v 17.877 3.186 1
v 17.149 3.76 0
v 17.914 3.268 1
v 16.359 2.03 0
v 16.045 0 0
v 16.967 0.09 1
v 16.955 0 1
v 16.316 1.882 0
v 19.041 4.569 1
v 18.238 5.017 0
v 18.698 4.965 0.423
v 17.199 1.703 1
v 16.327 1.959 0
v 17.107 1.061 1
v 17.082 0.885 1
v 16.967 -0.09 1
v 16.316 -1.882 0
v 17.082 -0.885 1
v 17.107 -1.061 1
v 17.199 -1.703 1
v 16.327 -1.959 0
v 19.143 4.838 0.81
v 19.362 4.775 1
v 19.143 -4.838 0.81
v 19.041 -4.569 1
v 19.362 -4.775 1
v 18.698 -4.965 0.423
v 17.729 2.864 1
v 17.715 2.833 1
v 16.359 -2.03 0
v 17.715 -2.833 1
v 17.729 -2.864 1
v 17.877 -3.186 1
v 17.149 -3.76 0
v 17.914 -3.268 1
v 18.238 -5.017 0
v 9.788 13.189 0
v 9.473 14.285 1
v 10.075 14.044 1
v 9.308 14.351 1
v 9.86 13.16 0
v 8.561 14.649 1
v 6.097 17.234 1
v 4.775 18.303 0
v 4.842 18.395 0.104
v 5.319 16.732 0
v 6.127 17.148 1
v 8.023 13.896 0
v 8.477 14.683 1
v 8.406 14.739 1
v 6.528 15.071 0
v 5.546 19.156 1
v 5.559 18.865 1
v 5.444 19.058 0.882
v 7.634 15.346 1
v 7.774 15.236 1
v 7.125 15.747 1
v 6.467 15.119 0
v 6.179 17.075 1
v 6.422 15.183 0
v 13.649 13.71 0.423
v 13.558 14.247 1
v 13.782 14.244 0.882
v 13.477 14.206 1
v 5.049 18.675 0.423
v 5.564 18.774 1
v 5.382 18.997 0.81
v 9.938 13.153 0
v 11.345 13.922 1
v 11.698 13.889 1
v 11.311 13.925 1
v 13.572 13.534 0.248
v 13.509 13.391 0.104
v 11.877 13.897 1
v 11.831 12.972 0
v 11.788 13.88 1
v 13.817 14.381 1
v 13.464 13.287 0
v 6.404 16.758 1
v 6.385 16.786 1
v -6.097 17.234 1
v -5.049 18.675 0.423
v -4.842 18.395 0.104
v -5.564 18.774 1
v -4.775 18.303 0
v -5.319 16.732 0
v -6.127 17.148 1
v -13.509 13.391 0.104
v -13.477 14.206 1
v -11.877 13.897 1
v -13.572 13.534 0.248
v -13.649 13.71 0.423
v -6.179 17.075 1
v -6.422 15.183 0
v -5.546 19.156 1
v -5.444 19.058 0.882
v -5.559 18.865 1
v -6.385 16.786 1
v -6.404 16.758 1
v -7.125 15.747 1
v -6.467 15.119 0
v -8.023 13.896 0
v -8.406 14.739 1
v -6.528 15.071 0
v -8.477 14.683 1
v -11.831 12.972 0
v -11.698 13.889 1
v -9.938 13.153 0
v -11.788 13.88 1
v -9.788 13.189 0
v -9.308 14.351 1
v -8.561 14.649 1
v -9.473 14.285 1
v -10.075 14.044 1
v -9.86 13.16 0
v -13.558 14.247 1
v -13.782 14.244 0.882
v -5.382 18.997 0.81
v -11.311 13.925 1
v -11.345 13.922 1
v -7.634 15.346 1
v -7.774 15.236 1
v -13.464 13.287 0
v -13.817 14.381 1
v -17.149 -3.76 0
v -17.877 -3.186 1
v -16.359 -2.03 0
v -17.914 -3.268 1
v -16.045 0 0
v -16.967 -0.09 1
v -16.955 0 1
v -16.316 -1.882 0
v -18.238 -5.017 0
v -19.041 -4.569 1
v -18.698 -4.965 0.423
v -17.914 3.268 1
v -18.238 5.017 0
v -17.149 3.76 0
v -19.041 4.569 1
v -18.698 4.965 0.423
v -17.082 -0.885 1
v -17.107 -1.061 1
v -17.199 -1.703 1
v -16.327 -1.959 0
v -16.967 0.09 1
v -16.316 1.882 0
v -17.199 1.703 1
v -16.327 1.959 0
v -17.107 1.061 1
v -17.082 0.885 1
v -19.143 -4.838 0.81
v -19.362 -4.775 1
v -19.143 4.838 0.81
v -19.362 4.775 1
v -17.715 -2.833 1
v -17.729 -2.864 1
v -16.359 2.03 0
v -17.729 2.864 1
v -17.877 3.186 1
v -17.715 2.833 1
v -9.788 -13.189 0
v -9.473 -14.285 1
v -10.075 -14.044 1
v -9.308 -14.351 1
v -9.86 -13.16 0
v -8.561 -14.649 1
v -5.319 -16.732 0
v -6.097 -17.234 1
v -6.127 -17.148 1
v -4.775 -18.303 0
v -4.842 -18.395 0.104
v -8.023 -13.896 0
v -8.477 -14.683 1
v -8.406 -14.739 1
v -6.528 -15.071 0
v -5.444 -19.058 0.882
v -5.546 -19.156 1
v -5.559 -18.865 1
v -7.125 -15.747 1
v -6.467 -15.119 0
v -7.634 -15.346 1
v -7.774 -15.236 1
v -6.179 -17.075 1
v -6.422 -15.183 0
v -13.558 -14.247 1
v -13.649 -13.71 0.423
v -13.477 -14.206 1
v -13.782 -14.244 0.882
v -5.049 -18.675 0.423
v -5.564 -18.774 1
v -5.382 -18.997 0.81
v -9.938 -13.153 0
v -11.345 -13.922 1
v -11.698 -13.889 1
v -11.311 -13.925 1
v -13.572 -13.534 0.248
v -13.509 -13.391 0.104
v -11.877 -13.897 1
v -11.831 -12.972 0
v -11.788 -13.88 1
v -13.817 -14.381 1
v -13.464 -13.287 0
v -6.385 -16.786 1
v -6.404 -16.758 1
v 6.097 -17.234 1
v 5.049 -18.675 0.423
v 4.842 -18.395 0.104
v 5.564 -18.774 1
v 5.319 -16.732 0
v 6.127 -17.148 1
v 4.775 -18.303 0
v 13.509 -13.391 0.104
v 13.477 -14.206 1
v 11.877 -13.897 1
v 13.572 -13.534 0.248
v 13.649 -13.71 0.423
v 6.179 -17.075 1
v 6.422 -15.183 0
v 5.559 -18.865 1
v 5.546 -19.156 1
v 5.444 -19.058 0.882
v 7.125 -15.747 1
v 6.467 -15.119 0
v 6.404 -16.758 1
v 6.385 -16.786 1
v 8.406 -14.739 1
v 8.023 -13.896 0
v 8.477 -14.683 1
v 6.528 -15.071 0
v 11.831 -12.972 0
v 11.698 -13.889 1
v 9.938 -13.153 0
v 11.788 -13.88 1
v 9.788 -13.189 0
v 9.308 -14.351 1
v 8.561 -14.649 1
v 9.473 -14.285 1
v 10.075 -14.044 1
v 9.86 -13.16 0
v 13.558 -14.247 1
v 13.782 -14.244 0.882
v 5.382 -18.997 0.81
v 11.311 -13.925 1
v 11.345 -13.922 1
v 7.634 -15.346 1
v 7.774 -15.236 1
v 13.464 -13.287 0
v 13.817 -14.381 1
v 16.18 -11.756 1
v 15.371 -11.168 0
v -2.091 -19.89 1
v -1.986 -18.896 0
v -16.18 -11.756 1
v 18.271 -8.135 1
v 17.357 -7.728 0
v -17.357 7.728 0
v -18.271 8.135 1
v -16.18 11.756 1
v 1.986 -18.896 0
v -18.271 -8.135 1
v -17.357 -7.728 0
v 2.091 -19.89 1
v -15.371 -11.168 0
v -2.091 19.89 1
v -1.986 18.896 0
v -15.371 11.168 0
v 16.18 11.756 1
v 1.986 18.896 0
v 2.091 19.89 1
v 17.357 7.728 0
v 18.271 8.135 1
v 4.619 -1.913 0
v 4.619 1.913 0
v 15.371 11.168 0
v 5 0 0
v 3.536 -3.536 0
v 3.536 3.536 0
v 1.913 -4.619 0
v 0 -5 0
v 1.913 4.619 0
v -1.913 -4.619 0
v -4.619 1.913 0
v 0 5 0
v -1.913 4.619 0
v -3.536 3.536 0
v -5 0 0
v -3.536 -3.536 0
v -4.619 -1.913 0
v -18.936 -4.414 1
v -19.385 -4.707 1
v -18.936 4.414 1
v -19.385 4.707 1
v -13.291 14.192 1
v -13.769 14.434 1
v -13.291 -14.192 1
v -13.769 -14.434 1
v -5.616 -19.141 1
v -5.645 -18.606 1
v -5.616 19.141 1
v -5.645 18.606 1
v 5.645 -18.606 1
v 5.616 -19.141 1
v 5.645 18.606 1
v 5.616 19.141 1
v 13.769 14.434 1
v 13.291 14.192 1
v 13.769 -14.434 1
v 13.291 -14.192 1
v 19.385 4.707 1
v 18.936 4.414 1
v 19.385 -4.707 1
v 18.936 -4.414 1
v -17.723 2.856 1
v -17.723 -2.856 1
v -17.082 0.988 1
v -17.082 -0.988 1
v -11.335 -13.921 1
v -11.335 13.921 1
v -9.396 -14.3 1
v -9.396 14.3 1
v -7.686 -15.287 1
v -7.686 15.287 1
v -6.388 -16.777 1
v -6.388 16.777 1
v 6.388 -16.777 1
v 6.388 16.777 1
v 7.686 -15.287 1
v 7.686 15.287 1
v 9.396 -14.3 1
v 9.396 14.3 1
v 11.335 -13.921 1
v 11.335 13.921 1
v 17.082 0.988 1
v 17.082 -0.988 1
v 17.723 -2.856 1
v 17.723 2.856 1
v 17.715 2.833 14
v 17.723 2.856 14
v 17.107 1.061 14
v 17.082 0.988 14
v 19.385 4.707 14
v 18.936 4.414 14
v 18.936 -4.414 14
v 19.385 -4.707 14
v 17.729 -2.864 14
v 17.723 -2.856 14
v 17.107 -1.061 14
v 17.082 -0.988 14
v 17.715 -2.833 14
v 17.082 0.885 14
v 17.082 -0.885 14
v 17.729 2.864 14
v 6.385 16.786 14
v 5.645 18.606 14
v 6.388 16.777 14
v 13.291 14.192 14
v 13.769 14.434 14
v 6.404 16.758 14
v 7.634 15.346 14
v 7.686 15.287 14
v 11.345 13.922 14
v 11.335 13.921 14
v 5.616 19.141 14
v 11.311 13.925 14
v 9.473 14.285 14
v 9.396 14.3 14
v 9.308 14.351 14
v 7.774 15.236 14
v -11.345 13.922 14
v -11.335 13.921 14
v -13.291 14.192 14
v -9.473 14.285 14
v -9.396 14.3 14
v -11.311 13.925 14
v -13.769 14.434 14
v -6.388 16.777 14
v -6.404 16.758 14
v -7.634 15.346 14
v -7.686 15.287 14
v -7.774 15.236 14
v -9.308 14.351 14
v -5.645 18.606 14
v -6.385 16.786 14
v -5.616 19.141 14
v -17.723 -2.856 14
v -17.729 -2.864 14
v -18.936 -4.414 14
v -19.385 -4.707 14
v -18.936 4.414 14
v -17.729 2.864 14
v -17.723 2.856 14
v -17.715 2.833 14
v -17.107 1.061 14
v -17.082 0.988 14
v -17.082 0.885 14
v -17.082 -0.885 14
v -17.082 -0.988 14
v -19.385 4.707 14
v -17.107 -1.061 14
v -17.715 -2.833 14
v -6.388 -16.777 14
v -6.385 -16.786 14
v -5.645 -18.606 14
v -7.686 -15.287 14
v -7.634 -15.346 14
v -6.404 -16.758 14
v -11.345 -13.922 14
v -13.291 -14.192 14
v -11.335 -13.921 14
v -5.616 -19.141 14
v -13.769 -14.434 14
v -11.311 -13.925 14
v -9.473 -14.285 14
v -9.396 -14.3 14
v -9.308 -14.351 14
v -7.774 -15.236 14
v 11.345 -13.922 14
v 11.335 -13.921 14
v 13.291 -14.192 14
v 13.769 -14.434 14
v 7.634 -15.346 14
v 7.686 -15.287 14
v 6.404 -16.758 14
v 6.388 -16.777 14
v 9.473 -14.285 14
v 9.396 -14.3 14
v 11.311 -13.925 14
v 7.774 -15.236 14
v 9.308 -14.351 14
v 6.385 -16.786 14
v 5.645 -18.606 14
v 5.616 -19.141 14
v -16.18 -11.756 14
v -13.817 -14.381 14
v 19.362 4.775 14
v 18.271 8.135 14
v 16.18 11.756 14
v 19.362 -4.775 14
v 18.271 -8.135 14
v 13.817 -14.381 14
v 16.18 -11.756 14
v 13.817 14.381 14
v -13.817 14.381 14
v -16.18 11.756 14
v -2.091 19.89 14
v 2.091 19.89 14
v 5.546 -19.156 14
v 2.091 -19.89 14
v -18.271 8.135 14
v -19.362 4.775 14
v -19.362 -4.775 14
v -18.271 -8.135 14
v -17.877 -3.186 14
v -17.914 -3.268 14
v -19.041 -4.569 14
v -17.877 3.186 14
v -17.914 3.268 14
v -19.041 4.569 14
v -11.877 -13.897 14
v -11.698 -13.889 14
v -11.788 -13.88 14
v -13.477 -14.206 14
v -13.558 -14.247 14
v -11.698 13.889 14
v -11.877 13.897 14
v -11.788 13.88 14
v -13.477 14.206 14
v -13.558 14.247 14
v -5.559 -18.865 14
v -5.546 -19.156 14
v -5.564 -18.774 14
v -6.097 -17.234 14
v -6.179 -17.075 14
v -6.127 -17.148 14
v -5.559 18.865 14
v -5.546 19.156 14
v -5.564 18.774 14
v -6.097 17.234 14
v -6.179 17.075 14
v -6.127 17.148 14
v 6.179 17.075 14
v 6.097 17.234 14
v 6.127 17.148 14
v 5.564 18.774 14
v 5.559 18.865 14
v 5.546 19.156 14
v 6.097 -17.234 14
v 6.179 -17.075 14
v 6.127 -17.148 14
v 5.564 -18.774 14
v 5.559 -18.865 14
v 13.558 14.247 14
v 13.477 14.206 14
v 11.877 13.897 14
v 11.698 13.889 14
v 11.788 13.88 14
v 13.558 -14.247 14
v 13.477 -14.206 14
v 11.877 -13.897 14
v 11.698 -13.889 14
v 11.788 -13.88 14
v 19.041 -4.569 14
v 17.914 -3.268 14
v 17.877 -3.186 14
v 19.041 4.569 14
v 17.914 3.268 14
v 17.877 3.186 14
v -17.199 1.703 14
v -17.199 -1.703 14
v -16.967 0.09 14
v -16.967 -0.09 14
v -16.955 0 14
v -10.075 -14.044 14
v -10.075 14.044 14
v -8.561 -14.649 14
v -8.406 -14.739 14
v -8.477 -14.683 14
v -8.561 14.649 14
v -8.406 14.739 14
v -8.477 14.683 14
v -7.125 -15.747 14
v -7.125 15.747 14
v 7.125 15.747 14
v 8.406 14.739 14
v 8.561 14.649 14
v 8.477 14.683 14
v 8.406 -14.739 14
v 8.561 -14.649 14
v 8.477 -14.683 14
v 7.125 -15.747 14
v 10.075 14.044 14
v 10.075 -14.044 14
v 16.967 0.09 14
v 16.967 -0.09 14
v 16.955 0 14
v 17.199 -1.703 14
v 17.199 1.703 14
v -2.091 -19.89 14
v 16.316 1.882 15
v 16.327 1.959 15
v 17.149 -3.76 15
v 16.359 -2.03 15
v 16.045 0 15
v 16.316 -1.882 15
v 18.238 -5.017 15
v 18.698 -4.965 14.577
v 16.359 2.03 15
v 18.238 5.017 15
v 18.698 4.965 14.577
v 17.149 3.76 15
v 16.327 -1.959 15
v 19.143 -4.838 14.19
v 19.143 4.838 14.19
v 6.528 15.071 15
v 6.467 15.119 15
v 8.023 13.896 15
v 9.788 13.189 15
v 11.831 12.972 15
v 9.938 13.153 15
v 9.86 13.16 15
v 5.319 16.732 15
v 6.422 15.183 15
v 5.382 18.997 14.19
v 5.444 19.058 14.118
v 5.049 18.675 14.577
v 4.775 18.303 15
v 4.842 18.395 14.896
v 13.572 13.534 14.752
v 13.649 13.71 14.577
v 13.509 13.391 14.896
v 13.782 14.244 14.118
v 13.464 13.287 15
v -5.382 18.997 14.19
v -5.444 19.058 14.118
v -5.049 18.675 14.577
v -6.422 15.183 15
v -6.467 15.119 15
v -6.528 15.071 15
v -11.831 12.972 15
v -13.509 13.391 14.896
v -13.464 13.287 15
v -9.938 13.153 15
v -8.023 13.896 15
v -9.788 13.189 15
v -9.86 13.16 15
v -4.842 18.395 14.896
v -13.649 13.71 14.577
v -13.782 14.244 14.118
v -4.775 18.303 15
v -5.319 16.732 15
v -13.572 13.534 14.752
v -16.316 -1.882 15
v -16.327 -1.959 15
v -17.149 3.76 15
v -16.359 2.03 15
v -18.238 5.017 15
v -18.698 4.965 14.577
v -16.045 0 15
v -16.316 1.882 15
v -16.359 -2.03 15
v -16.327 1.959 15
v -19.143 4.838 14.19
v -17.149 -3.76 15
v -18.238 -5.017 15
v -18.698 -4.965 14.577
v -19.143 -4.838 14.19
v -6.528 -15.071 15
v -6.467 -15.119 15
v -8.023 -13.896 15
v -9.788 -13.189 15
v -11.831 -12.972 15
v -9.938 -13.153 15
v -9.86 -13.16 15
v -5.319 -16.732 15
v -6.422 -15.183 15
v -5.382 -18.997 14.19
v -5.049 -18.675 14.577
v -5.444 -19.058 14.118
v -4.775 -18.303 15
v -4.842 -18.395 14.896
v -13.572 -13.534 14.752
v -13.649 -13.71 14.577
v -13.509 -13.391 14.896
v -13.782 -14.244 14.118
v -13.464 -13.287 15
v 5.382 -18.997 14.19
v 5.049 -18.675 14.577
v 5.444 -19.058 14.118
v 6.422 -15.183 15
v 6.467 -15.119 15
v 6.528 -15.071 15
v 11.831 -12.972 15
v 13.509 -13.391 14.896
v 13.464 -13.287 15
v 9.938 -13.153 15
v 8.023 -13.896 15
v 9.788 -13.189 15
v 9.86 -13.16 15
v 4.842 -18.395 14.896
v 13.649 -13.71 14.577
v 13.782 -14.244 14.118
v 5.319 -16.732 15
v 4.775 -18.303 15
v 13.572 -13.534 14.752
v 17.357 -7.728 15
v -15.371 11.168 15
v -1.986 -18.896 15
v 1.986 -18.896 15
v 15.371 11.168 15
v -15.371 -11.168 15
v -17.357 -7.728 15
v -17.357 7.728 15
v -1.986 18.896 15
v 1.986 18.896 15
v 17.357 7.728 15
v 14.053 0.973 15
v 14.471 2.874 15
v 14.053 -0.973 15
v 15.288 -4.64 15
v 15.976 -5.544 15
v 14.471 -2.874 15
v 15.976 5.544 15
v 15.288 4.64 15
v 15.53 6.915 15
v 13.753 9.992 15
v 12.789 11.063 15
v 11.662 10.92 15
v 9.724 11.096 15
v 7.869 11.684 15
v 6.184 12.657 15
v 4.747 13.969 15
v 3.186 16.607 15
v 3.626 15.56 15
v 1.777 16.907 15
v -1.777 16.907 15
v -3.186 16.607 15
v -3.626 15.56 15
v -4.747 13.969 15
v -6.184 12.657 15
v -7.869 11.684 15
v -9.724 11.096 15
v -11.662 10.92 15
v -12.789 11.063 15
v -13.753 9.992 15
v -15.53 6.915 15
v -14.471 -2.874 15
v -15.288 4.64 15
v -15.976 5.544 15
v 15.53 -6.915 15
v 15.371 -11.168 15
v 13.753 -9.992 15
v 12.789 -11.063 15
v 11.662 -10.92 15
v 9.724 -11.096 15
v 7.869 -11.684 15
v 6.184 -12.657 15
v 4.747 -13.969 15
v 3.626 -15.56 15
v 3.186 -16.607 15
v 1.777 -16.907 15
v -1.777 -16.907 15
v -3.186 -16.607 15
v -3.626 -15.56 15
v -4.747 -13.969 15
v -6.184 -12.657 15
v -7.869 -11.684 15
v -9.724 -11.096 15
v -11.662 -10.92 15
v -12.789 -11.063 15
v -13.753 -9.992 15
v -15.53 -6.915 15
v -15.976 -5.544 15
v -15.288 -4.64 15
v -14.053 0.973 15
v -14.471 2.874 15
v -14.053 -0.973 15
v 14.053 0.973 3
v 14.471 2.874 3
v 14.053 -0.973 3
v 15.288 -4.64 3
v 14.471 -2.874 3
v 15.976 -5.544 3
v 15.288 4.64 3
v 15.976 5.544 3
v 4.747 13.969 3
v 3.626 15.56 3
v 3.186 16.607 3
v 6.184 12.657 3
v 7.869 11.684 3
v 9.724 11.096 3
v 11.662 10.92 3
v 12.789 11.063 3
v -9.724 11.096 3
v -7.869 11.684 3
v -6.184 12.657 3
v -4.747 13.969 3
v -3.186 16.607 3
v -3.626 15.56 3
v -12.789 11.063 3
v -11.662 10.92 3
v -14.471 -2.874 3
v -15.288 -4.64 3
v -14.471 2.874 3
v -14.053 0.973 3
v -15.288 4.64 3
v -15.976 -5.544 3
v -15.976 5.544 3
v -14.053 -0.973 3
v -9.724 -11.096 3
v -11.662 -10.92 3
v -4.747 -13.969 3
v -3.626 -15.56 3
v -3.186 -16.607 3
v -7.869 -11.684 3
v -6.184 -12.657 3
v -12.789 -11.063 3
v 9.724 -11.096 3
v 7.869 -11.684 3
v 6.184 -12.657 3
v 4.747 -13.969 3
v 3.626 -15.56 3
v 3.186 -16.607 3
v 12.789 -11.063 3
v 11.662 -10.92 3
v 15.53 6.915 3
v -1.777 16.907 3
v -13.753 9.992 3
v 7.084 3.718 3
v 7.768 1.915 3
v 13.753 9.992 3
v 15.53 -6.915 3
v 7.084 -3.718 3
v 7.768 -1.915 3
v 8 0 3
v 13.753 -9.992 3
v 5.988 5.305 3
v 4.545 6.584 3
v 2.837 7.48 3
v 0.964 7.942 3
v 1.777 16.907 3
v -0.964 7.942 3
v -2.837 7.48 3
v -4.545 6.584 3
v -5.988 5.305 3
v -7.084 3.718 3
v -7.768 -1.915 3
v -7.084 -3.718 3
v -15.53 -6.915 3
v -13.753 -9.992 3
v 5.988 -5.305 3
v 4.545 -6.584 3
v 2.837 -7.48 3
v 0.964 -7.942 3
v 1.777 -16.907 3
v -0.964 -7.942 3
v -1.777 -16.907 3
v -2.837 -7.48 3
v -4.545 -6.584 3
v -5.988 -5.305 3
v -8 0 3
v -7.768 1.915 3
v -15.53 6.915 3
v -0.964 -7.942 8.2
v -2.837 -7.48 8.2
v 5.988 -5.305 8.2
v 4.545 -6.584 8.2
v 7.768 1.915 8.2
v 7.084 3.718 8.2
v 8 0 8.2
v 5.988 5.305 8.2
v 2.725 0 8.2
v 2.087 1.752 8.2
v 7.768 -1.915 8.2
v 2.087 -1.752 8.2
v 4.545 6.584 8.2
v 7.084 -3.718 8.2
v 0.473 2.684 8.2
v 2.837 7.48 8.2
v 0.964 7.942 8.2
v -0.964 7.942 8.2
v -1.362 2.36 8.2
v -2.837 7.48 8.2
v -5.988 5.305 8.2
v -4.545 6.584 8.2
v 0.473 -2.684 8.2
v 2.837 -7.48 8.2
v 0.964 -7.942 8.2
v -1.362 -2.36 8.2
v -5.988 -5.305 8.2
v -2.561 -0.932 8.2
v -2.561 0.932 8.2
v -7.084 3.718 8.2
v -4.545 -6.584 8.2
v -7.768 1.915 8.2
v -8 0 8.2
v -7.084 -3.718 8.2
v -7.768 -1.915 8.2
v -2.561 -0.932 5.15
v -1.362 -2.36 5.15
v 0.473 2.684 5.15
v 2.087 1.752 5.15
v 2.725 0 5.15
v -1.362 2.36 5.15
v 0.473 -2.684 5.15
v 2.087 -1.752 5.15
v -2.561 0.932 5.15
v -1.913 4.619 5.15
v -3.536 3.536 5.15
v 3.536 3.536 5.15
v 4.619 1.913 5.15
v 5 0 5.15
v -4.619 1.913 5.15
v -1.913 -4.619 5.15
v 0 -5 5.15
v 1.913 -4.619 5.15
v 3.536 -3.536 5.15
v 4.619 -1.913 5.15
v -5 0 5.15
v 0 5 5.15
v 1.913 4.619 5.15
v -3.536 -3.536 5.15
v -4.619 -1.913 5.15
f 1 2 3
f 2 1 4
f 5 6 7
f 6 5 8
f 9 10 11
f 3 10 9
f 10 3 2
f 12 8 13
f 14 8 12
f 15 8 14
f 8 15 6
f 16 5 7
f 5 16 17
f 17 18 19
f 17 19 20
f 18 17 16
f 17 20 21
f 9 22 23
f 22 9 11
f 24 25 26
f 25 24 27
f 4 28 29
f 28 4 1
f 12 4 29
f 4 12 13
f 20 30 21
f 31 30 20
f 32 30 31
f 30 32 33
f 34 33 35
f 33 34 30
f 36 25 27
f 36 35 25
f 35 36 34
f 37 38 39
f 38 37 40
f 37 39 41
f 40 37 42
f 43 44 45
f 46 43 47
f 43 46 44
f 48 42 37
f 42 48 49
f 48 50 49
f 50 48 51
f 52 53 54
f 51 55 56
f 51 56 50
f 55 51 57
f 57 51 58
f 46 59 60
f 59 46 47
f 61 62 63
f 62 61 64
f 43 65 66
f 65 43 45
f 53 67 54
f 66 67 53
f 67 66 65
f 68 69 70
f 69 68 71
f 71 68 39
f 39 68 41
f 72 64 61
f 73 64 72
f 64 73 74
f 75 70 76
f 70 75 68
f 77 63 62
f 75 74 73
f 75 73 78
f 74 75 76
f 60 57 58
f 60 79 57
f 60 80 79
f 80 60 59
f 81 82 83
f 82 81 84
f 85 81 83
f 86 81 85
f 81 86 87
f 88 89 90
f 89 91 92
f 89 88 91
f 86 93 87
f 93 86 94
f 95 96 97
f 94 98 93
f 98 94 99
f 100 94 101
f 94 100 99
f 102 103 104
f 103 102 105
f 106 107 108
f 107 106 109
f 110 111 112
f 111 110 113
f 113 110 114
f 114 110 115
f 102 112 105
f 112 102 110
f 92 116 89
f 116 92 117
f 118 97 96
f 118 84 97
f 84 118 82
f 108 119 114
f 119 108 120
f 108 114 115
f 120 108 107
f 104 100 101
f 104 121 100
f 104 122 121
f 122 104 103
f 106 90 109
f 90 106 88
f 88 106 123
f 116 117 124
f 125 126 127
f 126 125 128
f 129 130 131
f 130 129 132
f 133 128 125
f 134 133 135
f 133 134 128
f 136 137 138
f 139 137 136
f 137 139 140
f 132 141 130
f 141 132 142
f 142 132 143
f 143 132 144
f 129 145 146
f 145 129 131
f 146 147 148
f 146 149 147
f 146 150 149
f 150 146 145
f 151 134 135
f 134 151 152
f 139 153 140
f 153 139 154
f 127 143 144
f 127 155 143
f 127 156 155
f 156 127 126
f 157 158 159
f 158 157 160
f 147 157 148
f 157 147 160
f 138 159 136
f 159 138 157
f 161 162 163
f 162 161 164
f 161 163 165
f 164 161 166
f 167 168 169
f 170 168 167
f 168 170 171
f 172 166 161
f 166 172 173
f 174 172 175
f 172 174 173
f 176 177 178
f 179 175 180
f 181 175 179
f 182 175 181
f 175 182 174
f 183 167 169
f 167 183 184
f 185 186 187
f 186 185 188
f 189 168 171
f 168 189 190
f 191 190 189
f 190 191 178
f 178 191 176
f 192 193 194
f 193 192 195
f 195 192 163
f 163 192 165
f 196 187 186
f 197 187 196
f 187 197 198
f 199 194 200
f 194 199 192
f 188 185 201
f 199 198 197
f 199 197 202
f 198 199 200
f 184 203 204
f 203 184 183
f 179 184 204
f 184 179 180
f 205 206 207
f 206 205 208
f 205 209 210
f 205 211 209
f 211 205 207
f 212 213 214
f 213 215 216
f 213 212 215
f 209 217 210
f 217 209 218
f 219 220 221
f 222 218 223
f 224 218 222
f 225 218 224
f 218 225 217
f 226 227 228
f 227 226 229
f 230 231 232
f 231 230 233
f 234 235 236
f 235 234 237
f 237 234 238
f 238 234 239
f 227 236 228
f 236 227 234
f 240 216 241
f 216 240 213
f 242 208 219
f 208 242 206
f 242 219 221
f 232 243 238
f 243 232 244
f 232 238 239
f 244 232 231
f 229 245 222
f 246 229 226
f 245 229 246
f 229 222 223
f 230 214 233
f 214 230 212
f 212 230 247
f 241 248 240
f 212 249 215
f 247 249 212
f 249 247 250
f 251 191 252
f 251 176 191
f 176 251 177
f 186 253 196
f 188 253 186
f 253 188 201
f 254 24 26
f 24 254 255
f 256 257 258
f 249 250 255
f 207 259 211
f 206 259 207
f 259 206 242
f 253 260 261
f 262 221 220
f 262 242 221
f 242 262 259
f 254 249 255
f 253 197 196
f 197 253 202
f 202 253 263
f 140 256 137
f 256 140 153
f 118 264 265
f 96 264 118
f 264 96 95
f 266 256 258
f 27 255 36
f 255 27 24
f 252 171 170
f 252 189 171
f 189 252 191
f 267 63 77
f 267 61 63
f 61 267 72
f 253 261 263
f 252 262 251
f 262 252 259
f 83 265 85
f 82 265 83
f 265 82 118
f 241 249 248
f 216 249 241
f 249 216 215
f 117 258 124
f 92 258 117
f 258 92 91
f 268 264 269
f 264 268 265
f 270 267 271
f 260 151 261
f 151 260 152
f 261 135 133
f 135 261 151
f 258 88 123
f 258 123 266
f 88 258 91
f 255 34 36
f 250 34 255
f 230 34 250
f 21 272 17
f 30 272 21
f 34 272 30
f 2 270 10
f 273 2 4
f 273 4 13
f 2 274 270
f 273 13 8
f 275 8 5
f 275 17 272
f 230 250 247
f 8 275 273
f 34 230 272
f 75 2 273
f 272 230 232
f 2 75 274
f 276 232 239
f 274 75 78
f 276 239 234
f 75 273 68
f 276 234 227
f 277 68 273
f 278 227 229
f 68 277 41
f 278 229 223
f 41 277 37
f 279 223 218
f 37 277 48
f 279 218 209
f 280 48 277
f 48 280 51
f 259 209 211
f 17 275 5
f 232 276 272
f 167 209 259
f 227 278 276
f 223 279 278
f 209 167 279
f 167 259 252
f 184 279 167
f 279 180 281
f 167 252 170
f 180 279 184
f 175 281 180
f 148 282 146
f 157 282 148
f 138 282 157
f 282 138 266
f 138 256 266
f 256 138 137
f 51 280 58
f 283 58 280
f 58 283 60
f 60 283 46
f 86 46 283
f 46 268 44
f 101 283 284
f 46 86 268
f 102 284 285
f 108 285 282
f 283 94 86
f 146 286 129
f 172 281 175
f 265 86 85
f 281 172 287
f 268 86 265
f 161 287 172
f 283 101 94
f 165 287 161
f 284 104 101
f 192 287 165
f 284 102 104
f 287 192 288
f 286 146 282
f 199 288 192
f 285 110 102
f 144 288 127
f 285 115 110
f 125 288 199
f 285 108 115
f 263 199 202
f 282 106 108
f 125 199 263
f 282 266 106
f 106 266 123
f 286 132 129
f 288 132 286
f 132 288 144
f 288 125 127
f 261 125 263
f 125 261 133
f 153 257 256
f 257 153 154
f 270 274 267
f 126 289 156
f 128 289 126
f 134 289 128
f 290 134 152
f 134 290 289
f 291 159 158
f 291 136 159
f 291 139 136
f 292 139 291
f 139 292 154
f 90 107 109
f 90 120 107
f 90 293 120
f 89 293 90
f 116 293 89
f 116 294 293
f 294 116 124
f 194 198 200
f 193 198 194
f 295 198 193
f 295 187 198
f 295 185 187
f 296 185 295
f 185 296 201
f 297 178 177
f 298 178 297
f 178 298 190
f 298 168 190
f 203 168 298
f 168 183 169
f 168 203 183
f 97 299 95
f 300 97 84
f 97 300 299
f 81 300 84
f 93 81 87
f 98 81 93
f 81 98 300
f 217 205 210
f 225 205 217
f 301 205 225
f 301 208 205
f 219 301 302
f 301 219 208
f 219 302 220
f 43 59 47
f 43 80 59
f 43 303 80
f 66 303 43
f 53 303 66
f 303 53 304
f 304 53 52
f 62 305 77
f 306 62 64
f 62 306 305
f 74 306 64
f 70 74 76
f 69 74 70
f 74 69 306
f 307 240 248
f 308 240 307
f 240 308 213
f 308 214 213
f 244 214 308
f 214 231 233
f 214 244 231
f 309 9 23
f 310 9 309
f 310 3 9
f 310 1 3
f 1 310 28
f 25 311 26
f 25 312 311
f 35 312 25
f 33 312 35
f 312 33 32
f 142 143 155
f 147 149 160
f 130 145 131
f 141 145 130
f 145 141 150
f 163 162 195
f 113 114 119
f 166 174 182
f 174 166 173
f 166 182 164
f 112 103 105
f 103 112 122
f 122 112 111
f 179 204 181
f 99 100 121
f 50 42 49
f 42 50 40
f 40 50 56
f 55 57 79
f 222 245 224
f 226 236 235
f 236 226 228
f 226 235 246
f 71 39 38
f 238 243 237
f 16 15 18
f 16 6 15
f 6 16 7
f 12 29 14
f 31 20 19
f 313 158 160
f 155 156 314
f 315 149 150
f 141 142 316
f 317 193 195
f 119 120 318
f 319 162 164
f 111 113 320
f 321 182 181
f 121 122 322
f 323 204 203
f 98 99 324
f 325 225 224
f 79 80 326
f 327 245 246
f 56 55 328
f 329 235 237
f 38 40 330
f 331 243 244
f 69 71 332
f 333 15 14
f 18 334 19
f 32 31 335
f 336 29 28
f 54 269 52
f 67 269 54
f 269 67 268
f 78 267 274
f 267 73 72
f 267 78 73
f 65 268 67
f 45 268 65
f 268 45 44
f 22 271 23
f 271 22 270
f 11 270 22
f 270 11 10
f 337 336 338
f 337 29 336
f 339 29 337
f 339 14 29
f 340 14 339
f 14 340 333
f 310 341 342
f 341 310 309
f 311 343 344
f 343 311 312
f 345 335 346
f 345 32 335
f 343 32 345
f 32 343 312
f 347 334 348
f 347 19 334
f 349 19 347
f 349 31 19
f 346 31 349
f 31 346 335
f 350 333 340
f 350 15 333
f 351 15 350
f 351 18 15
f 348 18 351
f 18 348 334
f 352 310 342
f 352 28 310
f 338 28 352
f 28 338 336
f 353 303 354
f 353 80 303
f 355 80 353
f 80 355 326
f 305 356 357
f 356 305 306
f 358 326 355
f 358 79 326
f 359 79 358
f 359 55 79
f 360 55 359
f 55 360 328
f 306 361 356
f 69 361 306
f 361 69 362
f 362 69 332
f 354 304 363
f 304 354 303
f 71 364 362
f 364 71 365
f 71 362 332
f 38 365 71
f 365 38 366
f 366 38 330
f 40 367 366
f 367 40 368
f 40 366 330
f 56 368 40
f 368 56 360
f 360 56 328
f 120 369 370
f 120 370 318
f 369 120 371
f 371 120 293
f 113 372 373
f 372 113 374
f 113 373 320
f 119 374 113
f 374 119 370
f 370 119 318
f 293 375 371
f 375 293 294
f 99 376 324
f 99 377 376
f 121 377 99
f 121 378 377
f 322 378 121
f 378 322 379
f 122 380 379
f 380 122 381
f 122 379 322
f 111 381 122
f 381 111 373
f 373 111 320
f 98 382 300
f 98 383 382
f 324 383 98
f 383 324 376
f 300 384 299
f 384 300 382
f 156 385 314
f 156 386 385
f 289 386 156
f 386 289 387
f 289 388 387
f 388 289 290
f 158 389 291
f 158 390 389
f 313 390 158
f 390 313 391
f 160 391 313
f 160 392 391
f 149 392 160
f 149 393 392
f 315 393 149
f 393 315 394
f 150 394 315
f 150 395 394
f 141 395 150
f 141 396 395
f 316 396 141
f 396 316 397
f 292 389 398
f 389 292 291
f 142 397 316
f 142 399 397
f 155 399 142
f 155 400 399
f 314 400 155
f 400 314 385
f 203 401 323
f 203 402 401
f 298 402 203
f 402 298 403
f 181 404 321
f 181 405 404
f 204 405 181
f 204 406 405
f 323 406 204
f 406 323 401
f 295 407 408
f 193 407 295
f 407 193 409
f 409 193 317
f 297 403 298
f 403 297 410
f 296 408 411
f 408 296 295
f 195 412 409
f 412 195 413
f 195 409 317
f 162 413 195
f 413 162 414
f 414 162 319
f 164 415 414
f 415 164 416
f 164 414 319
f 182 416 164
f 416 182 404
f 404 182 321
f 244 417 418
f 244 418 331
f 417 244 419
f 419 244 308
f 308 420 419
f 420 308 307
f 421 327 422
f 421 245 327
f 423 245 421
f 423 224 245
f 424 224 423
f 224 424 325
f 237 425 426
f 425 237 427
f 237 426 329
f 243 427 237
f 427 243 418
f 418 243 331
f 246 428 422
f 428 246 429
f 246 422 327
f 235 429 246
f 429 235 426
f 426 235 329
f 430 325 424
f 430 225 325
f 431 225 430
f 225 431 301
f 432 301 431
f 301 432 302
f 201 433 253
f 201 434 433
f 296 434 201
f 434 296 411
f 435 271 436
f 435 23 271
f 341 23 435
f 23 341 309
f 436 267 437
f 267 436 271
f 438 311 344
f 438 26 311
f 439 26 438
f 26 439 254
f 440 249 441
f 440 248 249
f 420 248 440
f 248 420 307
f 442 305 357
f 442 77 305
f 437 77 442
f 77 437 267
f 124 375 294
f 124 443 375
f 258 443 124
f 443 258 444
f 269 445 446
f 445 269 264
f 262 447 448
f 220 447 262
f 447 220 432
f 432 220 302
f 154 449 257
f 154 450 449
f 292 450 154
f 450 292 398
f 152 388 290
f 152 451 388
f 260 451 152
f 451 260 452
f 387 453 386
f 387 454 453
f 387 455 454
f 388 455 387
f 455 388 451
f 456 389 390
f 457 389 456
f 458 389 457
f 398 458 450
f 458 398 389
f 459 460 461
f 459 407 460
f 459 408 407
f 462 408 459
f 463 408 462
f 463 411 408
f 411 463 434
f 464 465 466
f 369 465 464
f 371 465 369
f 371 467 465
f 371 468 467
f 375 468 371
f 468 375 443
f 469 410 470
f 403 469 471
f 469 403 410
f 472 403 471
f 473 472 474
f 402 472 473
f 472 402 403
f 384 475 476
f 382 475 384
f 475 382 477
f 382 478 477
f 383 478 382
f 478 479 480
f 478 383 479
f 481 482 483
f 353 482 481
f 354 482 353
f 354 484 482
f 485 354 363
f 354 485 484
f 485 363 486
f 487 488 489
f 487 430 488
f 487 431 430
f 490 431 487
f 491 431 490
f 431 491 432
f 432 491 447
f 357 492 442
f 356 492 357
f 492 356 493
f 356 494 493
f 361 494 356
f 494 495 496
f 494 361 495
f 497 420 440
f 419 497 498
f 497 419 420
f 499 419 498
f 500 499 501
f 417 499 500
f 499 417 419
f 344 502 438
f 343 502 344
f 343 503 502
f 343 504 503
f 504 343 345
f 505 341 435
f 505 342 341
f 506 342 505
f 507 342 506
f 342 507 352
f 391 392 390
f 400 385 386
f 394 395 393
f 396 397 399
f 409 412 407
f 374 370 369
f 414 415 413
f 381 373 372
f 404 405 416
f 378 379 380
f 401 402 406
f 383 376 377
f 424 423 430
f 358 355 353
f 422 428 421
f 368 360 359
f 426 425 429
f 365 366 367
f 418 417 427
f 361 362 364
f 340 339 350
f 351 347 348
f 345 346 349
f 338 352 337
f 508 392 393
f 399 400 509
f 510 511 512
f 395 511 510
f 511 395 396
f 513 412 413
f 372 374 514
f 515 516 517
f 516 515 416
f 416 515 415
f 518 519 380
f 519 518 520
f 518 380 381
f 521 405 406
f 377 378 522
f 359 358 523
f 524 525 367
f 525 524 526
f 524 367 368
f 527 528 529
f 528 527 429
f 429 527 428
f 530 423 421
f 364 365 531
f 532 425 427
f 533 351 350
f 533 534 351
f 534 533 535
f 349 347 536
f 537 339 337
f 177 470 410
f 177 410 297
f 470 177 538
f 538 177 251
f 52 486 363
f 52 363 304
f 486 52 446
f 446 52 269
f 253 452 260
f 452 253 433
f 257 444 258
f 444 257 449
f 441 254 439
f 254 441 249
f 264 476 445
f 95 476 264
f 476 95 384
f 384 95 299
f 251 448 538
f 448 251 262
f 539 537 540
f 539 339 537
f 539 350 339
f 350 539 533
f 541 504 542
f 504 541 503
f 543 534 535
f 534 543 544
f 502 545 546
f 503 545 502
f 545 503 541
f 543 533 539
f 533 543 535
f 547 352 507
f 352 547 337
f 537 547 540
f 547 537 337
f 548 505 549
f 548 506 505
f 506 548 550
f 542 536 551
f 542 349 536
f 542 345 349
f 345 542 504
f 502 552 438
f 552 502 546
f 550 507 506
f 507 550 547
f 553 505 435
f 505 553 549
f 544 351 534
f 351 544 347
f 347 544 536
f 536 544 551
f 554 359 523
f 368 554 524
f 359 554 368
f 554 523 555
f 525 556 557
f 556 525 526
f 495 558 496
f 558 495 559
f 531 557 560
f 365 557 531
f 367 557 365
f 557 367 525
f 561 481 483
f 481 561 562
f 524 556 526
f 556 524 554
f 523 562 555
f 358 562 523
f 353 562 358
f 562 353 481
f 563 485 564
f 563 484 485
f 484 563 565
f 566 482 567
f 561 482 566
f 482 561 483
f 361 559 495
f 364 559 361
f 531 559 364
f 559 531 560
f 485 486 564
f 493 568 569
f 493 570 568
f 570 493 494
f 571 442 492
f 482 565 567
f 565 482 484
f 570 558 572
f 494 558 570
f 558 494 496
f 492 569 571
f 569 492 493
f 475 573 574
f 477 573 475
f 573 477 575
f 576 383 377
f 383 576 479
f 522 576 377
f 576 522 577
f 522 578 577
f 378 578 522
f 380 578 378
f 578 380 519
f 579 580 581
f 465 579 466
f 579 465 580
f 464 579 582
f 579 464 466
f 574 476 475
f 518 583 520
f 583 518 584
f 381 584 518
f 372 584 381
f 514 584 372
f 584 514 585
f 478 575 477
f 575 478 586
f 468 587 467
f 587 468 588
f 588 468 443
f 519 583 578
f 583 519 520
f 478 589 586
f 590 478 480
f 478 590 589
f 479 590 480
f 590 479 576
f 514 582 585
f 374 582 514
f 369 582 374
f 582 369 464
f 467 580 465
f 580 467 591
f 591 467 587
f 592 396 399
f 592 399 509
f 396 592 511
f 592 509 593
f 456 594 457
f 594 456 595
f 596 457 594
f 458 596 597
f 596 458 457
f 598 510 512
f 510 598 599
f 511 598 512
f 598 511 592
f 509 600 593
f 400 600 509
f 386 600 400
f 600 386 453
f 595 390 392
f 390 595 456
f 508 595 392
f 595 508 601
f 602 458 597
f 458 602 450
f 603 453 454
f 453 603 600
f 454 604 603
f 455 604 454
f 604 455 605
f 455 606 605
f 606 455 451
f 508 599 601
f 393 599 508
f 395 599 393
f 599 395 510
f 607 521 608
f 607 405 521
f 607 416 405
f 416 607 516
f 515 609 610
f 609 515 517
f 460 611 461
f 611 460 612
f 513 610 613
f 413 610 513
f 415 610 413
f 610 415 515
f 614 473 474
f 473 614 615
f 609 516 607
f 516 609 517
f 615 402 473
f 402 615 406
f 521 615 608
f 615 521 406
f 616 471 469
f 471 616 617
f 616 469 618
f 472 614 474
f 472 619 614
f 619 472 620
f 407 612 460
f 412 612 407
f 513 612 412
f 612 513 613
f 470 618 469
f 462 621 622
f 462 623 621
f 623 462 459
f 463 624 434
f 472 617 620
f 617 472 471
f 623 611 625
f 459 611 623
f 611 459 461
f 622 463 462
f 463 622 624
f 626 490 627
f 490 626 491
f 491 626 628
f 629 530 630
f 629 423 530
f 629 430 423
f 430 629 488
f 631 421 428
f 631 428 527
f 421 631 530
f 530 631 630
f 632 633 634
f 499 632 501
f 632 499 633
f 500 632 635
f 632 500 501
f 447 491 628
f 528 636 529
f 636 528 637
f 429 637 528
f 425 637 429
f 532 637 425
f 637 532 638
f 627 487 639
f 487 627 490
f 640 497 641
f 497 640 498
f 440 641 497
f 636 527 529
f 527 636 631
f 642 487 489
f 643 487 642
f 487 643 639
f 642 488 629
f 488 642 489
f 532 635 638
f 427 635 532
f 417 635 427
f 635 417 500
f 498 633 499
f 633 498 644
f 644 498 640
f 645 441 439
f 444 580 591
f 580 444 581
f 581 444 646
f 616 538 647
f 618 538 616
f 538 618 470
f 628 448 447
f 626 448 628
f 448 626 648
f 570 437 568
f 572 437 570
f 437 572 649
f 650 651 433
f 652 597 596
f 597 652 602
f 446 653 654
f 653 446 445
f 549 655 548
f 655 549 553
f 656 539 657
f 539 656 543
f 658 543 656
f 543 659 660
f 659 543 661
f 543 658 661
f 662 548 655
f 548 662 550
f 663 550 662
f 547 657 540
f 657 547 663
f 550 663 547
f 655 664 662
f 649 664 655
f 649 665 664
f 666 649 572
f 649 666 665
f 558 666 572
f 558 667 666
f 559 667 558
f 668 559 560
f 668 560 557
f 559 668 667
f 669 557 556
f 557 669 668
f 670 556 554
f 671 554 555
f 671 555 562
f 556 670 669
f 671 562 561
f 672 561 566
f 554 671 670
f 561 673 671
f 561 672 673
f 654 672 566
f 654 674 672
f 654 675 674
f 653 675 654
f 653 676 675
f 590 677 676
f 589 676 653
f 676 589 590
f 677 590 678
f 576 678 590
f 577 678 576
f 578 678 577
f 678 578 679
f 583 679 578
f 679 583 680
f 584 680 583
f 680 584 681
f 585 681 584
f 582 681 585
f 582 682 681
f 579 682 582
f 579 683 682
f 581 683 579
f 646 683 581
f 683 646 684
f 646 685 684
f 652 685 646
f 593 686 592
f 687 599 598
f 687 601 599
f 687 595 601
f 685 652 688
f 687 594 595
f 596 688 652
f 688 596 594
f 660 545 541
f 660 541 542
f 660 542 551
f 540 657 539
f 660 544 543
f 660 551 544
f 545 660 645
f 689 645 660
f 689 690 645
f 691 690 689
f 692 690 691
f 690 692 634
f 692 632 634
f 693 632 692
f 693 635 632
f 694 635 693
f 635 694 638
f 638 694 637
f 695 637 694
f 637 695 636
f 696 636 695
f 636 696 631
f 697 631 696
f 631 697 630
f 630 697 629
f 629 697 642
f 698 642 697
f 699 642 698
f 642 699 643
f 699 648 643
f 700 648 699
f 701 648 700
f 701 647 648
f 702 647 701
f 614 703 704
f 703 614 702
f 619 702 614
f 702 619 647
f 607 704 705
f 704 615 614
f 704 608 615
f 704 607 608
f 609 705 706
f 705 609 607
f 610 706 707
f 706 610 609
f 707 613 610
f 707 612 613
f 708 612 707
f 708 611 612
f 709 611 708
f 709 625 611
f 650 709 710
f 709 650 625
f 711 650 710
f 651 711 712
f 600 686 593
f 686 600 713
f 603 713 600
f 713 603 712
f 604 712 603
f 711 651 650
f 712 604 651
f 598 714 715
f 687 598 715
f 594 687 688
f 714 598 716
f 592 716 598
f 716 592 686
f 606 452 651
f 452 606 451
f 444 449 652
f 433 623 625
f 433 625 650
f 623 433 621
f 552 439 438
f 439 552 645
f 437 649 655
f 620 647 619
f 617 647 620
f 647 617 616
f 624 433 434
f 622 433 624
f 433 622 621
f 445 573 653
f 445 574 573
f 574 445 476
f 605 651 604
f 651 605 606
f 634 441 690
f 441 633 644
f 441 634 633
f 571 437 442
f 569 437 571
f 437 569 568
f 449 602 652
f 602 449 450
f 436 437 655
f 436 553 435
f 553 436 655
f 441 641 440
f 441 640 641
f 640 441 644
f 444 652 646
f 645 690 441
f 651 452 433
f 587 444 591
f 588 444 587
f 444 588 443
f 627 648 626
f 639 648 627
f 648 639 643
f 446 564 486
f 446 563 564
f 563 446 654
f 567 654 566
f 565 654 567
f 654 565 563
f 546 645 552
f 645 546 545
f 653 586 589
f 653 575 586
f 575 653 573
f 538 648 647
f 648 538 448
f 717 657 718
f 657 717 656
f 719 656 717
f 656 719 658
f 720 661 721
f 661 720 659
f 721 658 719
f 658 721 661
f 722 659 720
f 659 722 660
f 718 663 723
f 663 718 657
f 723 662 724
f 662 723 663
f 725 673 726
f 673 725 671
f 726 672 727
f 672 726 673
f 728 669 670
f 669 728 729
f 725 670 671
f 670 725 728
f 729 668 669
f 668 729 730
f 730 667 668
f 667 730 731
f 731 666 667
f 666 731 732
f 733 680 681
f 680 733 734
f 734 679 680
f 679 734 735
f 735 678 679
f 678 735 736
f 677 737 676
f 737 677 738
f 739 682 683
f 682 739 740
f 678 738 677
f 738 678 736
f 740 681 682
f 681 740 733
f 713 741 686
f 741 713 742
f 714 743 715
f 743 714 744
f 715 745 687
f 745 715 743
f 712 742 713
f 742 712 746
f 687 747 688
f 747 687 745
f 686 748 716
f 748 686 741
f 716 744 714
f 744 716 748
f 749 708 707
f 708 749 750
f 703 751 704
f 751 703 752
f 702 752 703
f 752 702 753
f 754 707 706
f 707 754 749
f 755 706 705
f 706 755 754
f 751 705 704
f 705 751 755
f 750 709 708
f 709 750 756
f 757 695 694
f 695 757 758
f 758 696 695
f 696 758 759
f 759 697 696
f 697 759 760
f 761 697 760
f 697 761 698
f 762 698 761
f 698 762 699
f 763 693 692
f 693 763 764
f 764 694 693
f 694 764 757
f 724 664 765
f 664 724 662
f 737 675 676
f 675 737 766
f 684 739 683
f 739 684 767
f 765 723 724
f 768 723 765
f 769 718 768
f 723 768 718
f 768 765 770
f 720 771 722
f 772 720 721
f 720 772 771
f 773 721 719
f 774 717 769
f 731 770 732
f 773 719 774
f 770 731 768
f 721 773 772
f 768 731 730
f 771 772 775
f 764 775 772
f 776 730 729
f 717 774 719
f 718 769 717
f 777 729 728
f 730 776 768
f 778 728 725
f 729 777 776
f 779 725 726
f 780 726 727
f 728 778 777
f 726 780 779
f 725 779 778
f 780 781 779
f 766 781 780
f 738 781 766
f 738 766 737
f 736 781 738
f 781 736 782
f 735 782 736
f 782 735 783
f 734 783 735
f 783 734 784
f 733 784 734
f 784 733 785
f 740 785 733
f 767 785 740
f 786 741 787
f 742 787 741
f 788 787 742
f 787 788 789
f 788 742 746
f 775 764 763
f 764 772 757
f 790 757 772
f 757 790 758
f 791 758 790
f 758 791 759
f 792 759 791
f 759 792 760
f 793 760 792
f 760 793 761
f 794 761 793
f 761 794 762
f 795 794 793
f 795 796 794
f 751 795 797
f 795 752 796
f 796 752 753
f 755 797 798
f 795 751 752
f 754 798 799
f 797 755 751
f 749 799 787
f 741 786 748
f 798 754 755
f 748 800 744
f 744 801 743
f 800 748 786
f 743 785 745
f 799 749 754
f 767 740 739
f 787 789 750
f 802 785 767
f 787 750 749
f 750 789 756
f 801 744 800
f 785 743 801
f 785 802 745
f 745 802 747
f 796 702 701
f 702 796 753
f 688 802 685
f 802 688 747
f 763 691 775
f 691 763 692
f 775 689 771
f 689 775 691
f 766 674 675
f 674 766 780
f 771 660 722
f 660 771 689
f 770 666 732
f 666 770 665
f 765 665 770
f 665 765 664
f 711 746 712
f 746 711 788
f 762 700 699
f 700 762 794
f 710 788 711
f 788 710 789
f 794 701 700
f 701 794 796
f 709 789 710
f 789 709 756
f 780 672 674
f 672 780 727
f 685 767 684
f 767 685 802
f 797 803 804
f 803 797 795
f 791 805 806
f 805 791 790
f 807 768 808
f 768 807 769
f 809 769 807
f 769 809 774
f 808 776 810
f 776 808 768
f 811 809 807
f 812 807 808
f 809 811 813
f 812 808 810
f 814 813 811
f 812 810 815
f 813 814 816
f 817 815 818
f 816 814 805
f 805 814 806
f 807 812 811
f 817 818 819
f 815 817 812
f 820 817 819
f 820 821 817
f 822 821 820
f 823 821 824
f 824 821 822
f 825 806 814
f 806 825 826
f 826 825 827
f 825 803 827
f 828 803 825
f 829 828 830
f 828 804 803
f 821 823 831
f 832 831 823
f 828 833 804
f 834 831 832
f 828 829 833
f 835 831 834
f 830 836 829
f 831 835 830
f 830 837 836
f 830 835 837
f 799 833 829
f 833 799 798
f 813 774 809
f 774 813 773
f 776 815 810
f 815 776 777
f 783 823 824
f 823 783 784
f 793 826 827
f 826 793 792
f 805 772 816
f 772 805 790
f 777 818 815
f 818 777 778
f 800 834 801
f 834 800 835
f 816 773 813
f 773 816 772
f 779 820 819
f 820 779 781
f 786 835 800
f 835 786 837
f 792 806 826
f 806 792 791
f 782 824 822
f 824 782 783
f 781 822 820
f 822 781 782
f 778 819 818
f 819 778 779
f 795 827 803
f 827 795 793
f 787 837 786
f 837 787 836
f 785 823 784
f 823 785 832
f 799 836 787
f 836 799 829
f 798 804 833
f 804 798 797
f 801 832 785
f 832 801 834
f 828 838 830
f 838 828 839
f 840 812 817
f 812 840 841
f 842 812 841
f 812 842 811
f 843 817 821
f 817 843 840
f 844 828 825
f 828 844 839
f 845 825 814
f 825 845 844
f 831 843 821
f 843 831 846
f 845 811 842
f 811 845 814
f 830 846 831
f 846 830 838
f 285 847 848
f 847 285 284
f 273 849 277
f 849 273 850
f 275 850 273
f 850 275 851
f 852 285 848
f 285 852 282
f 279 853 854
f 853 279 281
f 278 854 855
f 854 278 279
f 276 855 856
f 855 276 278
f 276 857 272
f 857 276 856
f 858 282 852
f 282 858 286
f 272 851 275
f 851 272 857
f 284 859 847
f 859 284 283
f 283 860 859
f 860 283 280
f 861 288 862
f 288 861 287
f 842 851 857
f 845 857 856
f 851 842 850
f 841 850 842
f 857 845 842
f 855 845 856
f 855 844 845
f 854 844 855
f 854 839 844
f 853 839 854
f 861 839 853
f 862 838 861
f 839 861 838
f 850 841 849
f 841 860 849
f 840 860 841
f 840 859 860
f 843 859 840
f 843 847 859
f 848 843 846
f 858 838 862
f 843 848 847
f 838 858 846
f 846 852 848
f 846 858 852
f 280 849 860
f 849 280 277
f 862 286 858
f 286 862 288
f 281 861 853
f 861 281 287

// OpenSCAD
/*
Universal Thumbnut/Socket Knob Design
By: Harrison Fast (2013)

This is a parametric script for a thumb knob which can be used on either a nut, hex head cap screw, or socket head cap screw.
Options include:
unit of measure (metric, imperial)
thread size []
pocket type (Constant_Wall_Thickness, Solid, Circular)
knob diameter
number of rosettes (fingers/cutouts)
size and position of rosette
wall thickness
top wall thickness

Should work in the Thingiverse Customizer

*/

//****Variables - To be Set****\\
//CUSTOMIZER VARIABLES

//What's This Knob For?
Knob_Type=3;//[1:Nut,2:Hex Head Screw,3:Socket Head Screw]

//What Size Nut or Screw? 
Thread_Size=6; //[0:M1.6,1:M2,2:M2.5,3:M3,4:M4,5:M5,6:M6,7:M8,8:M10,9:M12,10:M14,11:M16,12:M20]

//What Kind of Pocket Do You Want?
Knob_Fill=1;//[1:Constant Wall Thickness,2:Solid,3:Circular Cut-Out]

//How Big Should The Knob Be?
Knob_Diameter = 40;
knob_r = Knob_Diameter/2;

//How Thick Should the Grip Be? (Overall Height)
Knob_Thickness=15;
knob_t=Knob_Thickness*1;

//How Thick Should The Walls Be?
Wall_Thickness=3;

//How Many Prongs Should It Have?
Number_of_Rosettes=6; //[1:16]

//How Big Should The Finger Dents Be?
Rosette_Radius=6; 

//How Far Should The Finger Dents be From The Knob Circumference? (This lets you use larger radii by moving the center of the cut-out cylinder away from the center of the knob)
Rosette_Offset = 3;

//How Big Should the Bevel Be?
Chamfer_Size=1;
r_cham = Chamfer_Size*1; //Too lazy to change the proper names to Chamfer_Size

//How Much Clearance Do You Want? 0 probably won't work.
Clearance=.25; //[0:.125:1];

//CUSTOMIZER VARIABLES END


//$fa=6;


echo(knob_t);
knob_hex(); //main function call


//****MODULES***\\

module hex_trude(hex_width,hex_height) //makes a hexagonal prism at hex_width
	{	
		s = hex_width/1.732;
		l_x=s/2;
		l_y=.866*s;
		a_1 = [ [s,0],[l_x,-l_y],[-l_x,-l_y],[-s,0],[-l_x,l_y],[l_x,l_y]];
		b=[0:5];
		linear_extrude (height = hex_height) polygon(a_1,b);
	}


module pocket(hex_width,hex_height)
{	
	if(Knob_Fill==1){
		difference() {
			 translate([0,0,Wall_Thickness]) {cylinder(h=hex_height, r=knob_r-Wall_Thickness);} //wall offset
				for(i=[0:Number_of_Rosettes-1]) {
					rotate([0,0,360*i/Number_of_Rosettes]) 
						translate([knob_r+Rosette_Offset,0,0]) {
							cylinder(h = Wall_Thickness+hex_height, r = Rosette_Radius+Wall_Thickness); } //wall offset rosette
								}
	}//endif
					}

	else if(Knob_Fill==2){
	}//endif

	else if(Knob_Fill==3) {
		translate([0,0,Wall_Thickness]) {
			cylinder(h=hex_height,r=knob_r-Wall_Thickness-Rosette_Radius+Rosette_Offset);
						}
	}//endif
			
} //end module pocket()



module knobby_base_parts(knob_r, knob_h, rA, rB)
{
	difference()
	{
		cylinder(h=knob_h,r1=knob_r-rA,r2=knob_r-rB);
		for(i=[0:Number_of_Rosettes]){
			rotate(360*i/Number_of_Rosettes,[0,0,1]) translate([knob_r+Rosette_Offset,0,-0.05])
				cylinder(h=knob_h+.1,r1=Rosette_Radius+rA,r2=Rosette_Radius+rB);
		} //end if
	} //end difference
} //end knobby_base_parts



module knobby_base(hex_width,hex_height,r_cham)
{
	difference(){
			union() {
				knobby_base_parts(knob_r,r_cham,r_cham,0);
				if(hex_height<Wall_Thickness){
					union() {
						translate([0,0,r_cham]) knobby_base_parts(knob_r,Wall_Thickness-2*r_cham,0,0); 
						translate([0,0,Wall_Thickness]) knobby_base_parts(knob_r, r_cham,0,r_cham);}}

				else {translate([0,0,r_cham]) knobby_base_parts(knob_r,hex_height-2*r_cham,0,0);
					union() {
						translate([0,0,r_cham]) knobby_base_parts(knob_r,hex_height-2*r_cham,0,0); 
						translate([0,0,hex_height-r_cham]) knobby_base_parts(knob_r, r_cham,0,r_cham); }}
				} //end union
			pocket(hex_width,hex_height+1);
					} //end difference
} //end knobby_base


module make_knob(hex_width,hex_height,r_cham)
{
	if(Knob_Type==1){
	difference(){
			union(){
			rotate(0,[0,0,1]) {
			difference(){
				knobby_base(hex_width,knob_t,r_cham);
				translate([0,0,Wall_Thickness])hex_trude(hex_width+.25,hex_height+1+knob_t);
				}}
			translate([0,0,Wall_Thickness]) {
				difference() {
					hex_trude(hex_width+Wall_Thickness*2,hex_height);
					hex_trude(hex_width+.25,hex_height+.1);}
					}}
		translate([0,0,-.1]) cylinder(h=Wall_Thickness+hex_height+.2, r = Thread_Size/2+.25);
	 } 	//end Difference
	} //end if

	else if(Knob_Type==2) {
	difference() {
		union() {
			knobby_base(hex_width,knob_t,r_cham);
			cylinder(h=hex_height+Wall_Thickness, r=hex_width/2+Wall_Thickness);
			} //end union
		translate([0,0,-.05]) hex_trude(hex_width+.25,hex_height);
		translate([0,0,-.5]) cylinder(h=hex_height+Wall_Thickness+1+knob_t, r=thread_d[Thread_Size]/2+.125);
		}//end difference
	}//end if
			

	else if(Knob_Type==3) {
	difference(){
		union() {
			knobby_base(hex_width,knob_t,r_cham);
			cylinder(h=hex_height+Wall_Thickness, r=hex_width/2+Wall_Thickness);
		}//end union
			translate([0,0,-.05]) cylinder(h=hex_height+Knob_Thickness, r=hex_height/2+.125);
			translate([0,0,-.05]) cylinder(h=hex_height, r=hex_width/2);
	} //end difference
		} //end if
} //end module make_knob_hex


module knob_hex(){
	if (Knob_Type==1 || 2){
		make_knob(hex_w_table[Thread_Size],hex_h_table[Thread_Size],r_cham);
		}//end if
	else if (Knob_Type==3){
		make_knob(shcs_d_table[Thread_Size],thread_d[Thread_Size],r_cham);
} //end_if
} //end knob_hex

//****END KNOB BUILDING****\\

//****LOOKUP TABLES****\\

//----Lookup----\\

//----Thread Outer Diameter----\\\\
thread_d=[1.6,2,2.5,3,4,5,6,8,10,12,14,16,20,24];

//----Hex Width----\\
hex_w_table=[3.2,4,5,5.5,7,8,10,13,16,18,21,24,30,36];

//----Hex Height----\\
hex_h_table=[1.3,1.6,2,2.4,3.2,4.7,5.2,6.8,8.4,10.8,12.8,14.8,18,21.5];

//----Hex Head Height----\\
hex_head_height=[1.3,2,2.1,2.1,2.9,3.5,4.1,5.4,6.5,7.6,8.8,10,12.5,15];

//----SHCS Diameter----\\
shcs_d_table=[2.5,3.8,4.2,5.5,7,8.5,10,13,16,18,21,24,27,30];
//----SHCS Height = Thread Size!---\\

